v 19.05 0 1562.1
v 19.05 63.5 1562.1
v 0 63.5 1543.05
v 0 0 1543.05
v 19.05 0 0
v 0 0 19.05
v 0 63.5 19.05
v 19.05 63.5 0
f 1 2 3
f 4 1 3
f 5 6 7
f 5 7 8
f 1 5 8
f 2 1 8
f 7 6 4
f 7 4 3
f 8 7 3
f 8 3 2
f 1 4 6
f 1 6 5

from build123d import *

# Parameters (mm, degrees)
F0_W     = 19.05
F0_H     = 63.5
F1_DEPTH = 1562.1
F3_DEPTH = 63.501
F5_DEPTH = 63.501


with BuildPart() as f1:
    # F0 (on Top) → F1 (new body)
    with BuildSketch(Plane.XY):
        with Locations((9.525, 31.75)):
            Rectangle(F0_W, F0_H)
    extrude(amount=F1_DEPTH)

    # F2 (on face) → F3 (cut, through all)
    with BuildSketch(Plane(origin=(0, 63.5, 0), x_dir=(-1, 0, 0), z_dir=(0, 1, 0))):
        Polygon((0, 19.05), (-19.05, 0), (0, 0), align=None)
    extrude(amount=-F3_DEPTH, mode=Mode.SUBTRACT)

    # F4 (on face) → F5 (cut, through all)
    with BuildSketch(Plane(origin=(0, 63.5, 0), x_dir=(-1, 0, 0), z_dir=(0, 1, 0))):
        Polygon((0, 1562.1), (-19.05, 1562.1), (0, 1543.05), align=None)
    extrude(amount=-F5_DEPTH, mode=Mode.SUBTRACT)


solid = f1.part
